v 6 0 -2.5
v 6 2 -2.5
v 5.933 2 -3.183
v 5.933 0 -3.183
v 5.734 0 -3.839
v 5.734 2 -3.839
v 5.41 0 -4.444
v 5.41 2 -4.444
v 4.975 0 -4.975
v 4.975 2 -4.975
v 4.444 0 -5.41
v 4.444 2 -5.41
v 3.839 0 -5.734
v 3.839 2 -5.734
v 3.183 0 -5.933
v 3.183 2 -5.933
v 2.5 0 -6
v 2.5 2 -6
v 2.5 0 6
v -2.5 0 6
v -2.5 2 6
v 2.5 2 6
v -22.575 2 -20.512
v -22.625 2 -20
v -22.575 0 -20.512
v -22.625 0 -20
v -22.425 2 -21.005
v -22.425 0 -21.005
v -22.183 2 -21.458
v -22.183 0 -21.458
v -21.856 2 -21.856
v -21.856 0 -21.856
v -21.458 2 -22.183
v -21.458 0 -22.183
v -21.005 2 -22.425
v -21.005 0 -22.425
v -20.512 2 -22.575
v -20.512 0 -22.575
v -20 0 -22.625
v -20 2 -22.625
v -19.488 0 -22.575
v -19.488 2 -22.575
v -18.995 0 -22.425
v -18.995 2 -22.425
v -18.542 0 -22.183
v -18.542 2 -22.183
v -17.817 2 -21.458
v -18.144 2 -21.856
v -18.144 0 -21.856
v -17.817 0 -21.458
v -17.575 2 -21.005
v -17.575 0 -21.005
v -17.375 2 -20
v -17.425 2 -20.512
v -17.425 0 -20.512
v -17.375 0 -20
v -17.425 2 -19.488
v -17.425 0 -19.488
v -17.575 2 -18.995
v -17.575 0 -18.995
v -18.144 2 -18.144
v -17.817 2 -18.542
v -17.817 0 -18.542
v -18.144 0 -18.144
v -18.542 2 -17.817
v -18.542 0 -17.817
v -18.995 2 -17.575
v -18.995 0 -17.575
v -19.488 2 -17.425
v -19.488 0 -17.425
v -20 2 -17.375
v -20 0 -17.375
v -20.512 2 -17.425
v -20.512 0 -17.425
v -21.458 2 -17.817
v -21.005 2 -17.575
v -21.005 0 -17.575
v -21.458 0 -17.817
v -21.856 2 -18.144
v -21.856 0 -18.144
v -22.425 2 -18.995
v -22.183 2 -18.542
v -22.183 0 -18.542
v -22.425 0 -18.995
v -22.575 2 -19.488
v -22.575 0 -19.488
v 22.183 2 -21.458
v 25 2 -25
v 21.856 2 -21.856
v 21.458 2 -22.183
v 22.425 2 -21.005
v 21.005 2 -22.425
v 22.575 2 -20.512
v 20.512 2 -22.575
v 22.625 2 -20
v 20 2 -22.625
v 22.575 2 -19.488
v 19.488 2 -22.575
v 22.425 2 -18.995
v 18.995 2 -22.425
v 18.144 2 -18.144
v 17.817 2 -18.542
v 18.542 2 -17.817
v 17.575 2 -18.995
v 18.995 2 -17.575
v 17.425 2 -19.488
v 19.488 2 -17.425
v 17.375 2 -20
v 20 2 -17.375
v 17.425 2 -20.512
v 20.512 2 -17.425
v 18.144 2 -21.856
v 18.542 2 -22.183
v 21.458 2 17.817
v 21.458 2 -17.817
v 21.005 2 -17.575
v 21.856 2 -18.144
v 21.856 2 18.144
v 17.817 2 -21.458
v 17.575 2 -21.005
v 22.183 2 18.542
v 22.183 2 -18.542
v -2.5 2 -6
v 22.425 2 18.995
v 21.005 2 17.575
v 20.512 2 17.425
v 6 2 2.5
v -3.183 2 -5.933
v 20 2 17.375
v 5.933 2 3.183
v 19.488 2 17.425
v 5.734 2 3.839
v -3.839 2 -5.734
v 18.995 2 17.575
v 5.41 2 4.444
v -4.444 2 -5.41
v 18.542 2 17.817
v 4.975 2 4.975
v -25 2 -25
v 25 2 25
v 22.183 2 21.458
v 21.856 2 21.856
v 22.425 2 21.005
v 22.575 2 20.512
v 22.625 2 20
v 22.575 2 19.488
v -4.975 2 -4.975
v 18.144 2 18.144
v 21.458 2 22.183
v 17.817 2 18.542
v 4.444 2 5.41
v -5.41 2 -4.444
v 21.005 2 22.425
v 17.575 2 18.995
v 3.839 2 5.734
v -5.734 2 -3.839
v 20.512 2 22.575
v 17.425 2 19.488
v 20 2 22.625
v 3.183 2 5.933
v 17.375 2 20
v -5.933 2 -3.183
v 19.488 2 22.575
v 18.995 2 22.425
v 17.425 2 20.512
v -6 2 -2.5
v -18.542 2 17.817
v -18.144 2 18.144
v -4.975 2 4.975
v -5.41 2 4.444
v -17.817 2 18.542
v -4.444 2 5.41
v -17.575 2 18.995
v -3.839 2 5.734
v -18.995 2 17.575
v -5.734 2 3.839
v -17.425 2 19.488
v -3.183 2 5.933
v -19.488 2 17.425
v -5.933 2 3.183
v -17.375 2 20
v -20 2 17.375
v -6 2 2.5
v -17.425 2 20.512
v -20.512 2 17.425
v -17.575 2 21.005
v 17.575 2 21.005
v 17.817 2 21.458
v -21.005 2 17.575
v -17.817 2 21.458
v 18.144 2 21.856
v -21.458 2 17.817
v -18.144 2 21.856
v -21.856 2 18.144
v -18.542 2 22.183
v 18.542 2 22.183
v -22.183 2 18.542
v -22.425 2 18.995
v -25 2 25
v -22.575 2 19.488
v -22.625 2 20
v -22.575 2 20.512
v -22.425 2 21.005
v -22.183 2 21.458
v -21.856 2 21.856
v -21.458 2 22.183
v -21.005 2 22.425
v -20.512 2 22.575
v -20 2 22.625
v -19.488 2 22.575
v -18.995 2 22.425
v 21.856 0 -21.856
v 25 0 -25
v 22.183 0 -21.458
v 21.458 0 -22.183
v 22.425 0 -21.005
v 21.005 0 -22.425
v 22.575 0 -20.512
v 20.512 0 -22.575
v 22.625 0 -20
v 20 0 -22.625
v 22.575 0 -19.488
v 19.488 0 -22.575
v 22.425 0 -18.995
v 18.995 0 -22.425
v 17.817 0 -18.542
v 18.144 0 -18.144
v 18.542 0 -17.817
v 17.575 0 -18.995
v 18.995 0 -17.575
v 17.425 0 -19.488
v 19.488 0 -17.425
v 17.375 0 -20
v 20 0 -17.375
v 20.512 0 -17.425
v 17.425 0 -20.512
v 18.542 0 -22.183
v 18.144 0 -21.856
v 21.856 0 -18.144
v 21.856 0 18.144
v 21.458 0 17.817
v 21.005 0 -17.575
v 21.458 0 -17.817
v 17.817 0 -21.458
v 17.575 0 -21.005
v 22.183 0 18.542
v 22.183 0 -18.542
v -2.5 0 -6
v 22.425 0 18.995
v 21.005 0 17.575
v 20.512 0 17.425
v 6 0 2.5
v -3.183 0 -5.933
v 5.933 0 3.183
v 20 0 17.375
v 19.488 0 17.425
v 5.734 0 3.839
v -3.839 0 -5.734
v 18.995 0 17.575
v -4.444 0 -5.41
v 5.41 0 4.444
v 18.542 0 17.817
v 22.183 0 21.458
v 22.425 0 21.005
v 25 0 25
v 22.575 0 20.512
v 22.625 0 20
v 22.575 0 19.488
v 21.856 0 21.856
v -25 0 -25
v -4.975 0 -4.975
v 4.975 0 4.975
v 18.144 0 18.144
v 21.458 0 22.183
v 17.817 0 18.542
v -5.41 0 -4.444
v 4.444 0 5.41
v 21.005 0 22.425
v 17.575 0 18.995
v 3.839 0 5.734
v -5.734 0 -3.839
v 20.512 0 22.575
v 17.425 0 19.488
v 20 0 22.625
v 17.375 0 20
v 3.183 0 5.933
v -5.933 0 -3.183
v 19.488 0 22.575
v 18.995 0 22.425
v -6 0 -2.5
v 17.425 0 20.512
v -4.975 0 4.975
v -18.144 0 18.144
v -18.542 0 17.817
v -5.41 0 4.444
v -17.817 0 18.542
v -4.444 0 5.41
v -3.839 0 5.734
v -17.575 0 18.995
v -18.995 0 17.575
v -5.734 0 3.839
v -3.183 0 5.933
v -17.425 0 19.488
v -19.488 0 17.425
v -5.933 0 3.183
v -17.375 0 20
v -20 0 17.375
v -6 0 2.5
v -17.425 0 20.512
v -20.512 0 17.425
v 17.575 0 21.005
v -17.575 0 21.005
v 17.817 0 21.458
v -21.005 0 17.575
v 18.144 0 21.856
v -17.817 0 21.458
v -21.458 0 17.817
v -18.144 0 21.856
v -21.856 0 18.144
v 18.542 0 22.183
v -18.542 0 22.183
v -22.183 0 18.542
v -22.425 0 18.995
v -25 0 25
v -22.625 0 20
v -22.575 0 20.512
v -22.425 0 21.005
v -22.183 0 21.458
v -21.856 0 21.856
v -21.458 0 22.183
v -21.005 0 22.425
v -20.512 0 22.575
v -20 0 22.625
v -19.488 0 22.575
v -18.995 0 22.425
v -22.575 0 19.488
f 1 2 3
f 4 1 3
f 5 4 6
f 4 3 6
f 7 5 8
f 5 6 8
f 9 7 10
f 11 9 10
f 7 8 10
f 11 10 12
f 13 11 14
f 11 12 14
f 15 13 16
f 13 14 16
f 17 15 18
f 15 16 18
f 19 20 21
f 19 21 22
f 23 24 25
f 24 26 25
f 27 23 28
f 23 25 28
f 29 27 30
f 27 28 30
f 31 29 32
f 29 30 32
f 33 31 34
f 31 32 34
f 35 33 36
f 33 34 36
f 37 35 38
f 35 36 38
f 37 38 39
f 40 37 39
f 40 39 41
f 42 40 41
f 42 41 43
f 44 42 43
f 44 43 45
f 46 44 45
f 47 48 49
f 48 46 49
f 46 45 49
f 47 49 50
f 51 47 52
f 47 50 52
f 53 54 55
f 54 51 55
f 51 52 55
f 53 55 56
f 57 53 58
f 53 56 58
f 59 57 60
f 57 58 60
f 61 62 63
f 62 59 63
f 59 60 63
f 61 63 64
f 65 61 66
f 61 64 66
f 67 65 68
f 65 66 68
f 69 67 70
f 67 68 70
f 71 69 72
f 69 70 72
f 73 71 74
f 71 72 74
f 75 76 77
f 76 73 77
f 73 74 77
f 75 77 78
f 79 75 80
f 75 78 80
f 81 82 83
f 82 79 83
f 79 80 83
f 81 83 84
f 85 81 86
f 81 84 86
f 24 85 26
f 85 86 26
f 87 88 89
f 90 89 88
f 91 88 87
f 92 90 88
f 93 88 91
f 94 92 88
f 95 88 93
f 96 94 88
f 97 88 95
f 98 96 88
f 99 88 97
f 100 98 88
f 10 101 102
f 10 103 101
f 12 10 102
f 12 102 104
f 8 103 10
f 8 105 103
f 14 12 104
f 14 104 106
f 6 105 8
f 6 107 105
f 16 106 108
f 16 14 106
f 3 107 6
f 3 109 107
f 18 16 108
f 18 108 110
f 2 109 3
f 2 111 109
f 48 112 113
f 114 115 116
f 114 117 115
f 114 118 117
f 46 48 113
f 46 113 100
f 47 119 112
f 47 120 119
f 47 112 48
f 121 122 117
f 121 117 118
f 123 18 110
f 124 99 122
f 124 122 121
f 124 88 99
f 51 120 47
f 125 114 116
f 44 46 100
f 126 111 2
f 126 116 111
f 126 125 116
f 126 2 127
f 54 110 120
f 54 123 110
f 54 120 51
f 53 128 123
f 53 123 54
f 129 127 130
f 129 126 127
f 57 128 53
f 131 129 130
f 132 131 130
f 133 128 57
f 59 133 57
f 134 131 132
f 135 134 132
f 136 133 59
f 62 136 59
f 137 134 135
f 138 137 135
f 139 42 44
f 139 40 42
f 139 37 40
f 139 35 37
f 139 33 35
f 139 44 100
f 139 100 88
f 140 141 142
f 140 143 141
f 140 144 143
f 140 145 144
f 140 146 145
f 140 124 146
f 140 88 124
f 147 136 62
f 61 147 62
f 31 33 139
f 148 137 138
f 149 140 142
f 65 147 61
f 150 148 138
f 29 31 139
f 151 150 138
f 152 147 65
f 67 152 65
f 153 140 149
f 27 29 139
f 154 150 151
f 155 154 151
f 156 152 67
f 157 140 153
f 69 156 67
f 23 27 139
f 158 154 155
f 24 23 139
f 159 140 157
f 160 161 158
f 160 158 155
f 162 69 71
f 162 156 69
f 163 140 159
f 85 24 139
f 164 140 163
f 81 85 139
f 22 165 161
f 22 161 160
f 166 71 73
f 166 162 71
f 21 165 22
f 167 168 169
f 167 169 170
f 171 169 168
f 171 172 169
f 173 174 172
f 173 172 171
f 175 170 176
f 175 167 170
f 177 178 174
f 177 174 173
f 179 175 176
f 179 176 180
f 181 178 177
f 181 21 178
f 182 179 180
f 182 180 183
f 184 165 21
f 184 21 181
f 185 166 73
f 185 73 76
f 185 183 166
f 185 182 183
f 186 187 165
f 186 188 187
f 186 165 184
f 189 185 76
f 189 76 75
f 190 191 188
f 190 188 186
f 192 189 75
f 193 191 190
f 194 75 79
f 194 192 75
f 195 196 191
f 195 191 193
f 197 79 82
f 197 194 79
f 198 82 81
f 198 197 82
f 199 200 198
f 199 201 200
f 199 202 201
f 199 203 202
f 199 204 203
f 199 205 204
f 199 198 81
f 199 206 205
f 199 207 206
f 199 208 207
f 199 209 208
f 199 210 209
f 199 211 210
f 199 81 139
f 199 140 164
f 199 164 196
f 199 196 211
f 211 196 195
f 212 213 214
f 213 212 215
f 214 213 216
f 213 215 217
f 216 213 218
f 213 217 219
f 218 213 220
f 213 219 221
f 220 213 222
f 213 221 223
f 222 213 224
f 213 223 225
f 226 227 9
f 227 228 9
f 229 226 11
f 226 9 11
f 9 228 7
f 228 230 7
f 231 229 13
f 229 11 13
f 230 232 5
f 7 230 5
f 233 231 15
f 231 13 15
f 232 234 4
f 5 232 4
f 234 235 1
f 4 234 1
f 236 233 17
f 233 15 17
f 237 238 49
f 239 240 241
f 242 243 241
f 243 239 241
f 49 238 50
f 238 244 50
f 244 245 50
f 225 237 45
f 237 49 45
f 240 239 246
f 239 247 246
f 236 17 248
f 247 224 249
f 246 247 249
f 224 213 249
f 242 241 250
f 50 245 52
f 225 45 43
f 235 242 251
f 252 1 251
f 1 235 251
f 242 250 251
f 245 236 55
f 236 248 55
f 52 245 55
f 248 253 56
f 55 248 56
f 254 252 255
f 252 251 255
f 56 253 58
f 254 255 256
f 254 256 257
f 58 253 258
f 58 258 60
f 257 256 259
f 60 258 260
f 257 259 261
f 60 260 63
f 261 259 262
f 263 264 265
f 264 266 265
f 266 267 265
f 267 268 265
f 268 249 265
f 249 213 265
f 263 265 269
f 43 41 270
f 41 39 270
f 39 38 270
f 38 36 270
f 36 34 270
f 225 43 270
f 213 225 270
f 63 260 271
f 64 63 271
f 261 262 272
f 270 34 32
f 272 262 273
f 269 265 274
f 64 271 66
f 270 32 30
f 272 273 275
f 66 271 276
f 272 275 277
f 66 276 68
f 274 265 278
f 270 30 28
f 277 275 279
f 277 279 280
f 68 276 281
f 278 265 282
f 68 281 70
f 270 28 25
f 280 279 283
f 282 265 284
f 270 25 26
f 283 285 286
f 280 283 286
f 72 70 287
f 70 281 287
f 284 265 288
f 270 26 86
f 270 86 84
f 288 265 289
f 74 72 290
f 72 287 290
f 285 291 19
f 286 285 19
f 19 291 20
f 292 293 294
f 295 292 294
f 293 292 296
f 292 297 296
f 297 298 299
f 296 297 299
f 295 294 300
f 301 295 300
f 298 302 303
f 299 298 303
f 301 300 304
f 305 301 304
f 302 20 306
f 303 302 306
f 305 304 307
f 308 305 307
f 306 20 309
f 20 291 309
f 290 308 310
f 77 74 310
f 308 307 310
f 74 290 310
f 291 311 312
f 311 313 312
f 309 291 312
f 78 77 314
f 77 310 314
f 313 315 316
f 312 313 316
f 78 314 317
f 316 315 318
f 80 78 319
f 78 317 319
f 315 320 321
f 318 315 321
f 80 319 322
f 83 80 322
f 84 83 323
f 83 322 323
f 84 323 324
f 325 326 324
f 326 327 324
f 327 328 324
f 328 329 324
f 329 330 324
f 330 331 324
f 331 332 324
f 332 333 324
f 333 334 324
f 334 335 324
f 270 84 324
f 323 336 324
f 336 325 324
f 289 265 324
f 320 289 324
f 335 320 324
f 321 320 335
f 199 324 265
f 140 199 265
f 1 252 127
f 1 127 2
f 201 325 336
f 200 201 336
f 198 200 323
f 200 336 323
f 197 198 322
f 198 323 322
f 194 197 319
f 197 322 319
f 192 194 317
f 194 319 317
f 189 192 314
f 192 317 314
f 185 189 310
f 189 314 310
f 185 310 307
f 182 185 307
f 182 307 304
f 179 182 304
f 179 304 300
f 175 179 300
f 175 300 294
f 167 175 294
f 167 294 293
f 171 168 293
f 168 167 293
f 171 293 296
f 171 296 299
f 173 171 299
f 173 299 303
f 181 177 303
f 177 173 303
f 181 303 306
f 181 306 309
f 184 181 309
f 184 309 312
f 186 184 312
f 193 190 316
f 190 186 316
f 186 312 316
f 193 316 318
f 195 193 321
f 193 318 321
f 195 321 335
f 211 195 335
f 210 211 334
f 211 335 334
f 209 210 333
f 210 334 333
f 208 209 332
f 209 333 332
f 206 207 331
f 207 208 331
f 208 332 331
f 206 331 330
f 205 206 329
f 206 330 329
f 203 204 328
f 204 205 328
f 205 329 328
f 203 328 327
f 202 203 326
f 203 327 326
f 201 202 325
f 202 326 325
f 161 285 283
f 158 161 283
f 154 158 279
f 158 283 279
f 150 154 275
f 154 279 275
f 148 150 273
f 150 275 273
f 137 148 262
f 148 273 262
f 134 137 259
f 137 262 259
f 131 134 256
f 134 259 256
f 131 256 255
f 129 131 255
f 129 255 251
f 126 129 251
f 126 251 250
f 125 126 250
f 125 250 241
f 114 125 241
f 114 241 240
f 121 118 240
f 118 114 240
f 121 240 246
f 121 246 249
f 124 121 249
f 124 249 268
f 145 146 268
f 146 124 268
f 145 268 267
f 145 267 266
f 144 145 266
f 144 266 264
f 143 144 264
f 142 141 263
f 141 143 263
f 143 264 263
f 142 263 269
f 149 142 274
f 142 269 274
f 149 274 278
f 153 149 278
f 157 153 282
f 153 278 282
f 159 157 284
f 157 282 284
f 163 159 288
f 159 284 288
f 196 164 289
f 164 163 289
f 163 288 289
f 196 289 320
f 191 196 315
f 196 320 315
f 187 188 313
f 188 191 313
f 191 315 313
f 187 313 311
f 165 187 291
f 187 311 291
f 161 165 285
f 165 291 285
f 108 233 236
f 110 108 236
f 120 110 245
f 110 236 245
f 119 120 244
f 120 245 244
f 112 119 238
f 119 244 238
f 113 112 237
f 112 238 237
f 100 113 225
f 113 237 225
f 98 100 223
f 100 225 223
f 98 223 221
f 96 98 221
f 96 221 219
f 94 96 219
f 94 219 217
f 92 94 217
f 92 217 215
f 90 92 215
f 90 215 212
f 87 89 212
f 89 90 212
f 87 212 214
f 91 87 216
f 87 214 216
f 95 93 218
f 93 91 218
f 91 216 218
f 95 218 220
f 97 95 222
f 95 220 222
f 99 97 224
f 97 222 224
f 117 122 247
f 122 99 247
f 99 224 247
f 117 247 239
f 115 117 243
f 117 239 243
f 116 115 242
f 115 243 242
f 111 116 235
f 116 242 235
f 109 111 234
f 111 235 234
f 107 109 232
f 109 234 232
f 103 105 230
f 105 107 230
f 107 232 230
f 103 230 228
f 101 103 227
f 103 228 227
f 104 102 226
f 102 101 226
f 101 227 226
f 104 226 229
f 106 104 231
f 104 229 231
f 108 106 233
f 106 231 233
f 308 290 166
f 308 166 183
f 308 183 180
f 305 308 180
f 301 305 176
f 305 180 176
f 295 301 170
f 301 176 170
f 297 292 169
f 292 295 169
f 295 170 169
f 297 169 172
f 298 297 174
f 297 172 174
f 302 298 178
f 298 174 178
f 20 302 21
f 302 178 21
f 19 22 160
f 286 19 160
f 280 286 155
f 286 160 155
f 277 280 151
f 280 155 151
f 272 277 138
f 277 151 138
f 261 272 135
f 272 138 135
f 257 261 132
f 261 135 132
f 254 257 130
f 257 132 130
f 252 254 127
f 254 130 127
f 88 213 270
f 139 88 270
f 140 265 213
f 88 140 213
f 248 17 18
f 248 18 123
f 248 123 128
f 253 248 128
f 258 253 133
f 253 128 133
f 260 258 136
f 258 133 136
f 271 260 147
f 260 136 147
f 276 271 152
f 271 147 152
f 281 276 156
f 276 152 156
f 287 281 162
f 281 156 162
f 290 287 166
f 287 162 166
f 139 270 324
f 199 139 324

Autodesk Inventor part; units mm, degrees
ref_plane "YZ Plane" through (0, 0, 0) normal (1, 0, 0) x (0, 1, 0)
ref_plane "XZ Plane" through (0, 0, 0) normal (0, 1, 0) x (-1, 0, 0)
ref_plane "XY Plane" through (0, 0, 0) normal (0, 0, 1) x (1, 0, 0)
sketch "Sketch1" plane through (0, 0, 0) normal (0, 1, 0) x (-1, 0, 0)
  line L0 (25, 25) -> (-25, 25)
  line L1 (-25, 25) -> (-25, -25)
  line L2 (-25, -25) -> (25, -25)
  line L3 (25, -25) -> (25, 25)
  line L4 (25, 25) -> (-25, -25) construction
  line L5 (-25, 25) -> (25, -25) construction
  line L6 (6, 6) -> (-6, 6)
  line L7 (-6, 6) -> (-6, -6)
  line L8 (-6, -6) -> (6, -6)
  line L9 (6, -6) -> (6, 6)
  line L10 (6, 6) -> (-6, -6) construction
  line L11 (-6, 6) -> (6, -6) construction
  line L12 (20, 20) -> (-20, 20) construction
  line L13 (-20, 20) -> (-20, -20) construction
  line L14 (-20, -20) -> (20, -20) construction
  line L15 (20, -20) -> (20, 20) construction
  line L16 (20, 20) -> (-20, -20) construction
  line L17 (-20, 20) -> (20, -20) construction
  circle A0 centre (20, 20) radius 2.625
  circle A1 centre (20, -20) radius 2.625
  circle A2 centre (-20, -20) radius 2.625
  circle A3 centre (-20, 20) radius 2.625
  point P0 (0, 0)
  dimension "d0" = 50
  dimension "d1" = 50
  dimension "d2" = 12
  dimension "d3" = 12
  dimension "d4" = 40
  dimension "d5" = 40
  dimension "d6" = 5.25
  dimension "d7" = 5.25
  dimension "d8" = 5.25
  dimension "d9" = 5.25
extrude "Extrusion1" add sketch "Sketch1" along normal blind 2
fillet "Fillet1" radius 3.5 4 edges at (-6, 1, 6) (-6, 1, -6) (6, 1, -6) (6, 1, 6)
properties part number "arena_middle"
